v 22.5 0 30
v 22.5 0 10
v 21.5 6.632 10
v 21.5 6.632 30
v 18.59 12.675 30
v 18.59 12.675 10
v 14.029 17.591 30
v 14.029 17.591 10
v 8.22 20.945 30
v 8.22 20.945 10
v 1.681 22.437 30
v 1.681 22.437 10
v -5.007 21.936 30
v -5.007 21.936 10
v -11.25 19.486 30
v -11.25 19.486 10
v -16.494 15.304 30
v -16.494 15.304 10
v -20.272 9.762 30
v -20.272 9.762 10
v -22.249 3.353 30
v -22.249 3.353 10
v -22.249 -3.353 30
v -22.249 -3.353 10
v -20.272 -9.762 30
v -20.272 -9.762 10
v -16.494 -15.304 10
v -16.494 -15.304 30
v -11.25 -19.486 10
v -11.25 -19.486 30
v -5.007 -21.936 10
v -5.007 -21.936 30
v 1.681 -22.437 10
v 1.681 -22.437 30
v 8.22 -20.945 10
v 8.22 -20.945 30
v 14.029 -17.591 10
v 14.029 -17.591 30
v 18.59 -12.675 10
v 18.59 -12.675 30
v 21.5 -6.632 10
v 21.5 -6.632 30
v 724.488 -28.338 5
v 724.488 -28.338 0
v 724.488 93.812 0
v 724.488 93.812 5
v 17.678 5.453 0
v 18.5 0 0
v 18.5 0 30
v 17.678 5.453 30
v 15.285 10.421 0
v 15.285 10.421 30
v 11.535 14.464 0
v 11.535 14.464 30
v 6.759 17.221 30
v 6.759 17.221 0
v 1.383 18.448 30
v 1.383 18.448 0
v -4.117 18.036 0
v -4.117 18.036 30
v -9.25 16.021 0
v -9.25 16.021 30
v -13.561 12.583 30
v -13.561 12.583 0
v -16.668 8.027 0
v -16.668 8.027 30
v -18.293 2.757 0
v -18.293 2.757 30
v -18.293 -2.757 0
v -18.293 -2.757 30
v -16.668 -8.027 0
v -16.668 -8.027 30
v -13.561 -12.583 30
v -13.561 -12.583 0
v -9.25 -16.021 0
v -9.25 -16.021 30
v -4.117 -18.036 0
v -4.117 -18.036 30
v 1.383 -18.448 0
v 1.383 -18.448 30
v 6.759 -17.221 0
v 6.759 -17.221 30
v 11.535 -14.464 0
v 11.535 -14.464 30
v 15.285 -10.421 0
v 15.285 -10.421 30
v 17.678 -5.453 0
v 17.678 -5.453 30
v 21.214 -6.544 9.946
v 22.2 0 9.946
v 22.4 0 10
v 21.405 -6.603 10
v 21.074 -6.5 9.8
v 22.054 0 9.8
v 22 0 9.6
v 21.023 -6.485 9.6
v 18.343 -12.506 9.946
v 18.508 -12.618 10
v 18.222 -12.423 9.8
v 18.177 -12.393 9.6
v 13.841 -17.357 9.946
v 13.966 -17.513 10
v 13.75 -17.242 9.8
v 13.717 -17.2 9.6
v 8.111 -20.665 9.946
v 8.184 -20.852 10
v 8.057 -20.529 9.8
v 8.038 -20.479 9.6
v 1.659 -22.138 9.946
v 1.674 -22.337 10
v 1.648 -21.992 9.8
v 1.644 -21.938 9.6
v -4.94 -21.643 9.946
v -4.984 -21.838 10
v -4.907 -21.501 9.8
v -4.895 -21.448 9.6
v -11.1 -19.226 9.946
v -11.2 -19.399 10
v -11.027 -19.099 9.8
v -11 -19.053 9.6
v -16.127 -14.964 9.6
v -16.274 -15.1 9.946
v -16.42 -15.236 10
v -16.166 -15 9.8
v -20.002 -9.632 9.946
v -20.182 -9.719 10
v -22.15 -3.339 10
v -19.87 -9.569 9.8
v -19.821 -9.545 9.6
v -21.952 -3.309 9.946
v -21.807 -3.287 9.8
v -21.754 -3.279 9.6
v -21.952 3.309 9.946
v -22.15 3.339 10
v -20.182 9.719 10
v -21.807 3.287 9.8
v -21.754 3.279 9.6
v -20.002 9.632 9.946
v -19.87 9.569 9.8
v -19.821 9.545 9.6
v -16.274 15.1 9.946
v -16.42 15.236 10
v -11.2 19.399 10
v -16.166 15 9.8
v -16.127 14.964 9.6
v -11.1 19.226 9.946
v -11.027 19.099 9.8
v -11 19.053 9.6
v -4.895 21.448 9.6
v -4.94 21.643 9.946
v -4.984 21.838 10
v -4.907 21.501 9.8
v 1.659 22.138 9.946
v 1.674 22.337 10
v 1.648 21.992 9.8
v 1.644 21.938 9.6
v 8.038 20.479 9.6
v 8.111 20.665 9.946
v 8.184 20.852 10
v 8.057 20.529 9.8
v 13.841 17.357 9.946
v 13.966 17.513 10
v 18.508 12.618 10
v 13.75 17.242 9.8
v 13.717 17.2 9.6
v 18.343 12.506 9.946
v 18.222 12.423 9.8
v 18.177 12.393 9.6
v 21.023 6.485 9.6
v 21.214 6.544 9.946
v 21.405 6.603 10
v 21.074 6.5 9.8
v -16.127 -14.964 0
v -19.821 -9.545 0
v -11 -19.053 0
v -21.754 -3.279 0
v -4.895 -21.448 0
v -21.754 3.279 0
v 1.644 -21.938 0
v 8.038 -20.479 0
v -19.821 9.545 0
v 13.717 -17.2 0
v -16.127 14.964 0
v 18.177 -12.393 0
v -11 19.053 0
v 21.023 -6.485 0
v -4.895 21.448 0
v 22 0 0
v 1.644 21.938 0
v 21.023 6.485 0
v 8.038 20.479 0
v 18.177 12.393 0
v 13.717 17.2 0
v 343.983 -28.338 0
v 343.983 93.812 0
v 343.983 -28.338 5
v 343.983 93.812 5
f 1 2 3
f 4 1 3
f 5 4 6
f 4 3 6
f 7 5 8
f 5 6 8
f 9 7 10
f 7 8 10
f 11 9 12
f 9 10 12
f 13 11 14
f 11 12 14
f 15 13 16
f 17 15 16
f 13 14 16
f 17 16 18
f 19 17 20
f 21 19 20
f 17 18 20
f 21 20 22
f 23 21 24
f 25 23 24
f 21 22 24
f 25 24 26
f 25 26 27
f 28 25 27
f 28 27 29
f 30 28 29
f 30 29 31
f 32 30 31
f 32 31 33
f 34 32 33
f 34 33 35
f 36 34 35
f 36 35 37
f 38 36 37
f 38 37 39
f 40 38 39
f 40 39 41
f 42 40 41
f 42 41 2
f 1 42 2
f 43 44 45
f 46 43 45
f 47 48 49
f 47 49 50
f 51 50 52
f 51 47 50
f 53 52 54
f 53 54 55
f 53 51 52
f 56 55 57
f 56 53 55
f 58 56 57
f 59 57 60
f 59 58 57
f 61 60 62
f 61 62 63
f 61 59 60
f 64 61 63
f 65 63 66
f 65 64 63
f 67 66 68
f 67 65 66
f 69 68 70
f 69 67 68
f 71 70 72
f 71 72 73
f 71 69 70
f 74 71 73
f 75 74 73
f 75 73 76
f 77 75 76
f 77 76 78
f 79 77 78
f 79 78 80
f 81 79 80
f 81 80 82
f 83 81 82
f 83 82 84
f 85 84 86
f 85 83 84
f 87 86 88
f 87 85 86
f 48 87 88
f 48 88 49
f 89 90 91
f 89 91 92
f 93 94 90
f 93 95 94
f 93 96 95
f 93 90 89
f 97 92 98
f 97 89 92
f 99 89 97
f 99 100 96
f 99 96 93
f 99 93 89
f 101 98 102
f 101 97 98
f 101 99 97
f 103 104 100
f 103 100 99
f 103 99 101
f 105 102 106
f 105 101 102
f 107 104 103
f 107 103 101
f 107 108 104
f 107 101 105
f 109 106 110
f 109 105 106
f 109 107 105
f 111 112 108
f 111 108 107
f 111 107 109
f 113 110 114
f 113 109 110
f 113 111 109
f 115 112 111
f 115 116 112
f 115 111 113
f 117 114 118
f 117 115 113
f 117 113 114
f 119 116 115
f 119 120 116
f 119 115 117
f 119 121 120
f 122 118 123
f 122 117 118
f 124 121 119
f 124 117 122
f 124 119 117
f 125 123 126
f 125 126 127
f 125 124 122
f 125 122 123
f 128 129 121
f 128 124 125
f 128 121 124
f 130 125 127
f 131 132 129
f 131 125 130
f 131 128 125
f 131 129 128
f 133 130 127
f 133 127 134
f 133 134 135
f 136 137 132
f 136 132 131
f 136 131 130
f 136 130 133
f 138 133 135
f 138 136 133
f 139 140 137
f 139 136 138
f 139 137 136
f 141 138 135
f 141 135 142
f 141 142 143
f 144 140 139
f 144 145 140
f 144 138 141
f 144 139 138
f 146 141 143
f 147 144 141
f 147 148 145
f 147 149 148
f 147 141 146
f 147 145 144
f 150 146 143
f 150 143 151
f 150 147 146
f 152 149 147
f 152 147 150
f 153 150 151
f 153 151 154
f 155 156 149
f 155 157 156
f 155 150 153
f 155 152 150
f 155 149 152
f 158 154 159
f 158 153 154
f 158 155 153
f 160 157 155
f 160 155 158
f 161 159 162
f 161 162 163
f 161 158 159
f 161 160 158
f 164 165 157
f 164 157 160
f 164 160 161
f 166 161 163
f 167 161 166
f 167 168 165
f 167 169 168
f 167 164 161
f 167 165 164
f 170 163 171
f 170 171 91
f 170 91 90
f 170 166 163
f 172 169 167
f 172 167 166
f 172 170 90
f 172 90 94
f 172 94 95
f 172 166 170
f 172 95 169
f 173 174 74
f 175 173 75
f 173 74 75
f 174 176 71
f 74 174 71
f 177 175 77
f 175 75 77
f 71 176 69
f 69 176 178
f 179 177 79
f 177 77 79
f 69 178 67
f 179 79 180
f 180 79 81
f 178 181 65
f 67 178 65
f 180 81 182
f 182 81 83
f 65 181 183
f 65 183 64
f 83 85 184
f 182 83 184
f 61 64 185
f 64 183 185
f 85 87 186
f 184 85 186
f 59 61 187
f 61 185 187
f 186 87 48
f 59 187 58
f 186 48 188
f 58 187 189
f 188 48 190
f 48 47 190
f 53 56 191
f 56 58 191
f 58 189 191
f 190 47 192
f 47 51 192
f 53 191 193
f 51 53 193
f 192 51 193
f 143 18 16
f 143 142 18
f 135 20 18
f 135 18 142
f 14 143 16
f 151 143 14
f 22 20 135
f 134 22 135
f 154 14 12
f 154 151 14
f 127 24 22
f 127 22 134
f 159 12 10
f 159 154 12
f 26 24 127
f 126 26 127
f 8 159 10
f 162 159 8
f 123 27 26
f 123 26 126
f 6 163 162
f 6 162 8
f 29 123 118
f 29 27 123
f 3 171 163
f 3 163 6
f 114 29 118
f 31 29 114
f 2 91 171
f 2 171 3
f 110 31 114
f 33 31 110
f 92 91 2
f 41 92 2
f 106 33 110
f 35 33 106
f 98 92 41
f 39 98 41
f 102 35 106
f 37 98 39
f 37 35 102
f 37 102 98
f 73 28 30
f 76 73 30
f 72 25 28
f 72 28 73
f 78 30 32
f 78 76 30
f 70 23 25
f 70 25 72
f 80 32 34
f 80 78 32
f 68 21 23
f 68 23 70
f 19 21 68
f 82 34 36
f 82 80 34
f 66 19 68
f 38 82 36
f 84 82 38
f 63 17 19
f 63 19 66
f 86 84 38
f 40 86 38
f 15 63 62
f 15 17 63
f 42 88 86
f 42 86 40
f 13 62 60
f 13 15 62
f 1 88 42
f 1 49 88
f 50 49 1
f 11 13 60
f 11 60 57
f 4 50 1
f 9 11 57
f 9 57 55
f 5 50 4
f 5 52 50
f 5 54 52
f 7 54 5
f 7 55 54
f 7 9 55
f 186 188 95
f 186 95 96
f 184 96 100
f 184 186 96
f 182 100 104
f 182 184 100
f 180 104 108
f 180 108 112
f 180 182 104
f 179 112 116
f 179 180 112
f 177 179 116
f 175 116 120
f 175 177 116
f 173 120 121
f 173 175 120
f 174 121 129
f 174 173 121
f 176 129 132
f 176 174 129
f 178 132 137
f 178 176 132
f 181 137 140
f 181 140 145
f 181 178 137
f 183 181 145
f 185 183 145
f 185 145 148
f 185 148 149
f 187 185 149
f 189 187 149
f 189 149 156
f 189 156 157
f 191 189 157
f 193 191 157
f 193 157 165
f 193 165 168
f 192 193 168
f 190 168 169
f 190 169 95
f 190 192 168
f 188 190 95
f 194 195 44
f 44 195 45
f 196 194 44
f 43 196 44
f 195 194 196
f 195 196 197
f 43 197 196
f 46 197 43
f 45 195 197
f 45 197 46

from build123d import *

# Parameters (mm, degrees)
F0_R     = 22.5
F0_R_2   = 18.5
F1_DEPTH = 30
F2_R     = 22.5
F2_R_2   = 22
F3_DEPTH = 10
F4_W     = 380.505711
F4_H     = 122.149726
F5_DEPTH = 5
F6_R     = 0.4


with BuildPart() as f1:
    # F0 (on Top) → F1 (new body)
    with BuildSketch(Plane.XY):
        Circle(F0_R)
        Circle(F0_R_2, mode=Mode.SUBTRACT)
    extrude(amount=F1_DEPTH)

    # F2 (on face) → F3 (cut)
    with BuildSketch(Plane(origin=(0, 0, 0), x_dir=(1, 0, 0), z_dir=(0, 0, -1))):
        Circle(F2_R)
        Circle(F2_R_2, mode=Mode.SUBTRACT)
    extrude(amount=-F3_DEPTH, mode=Mode.SUBTRACT)

    # F6
    f6_edges = [f1.edges().sort_by_distance(p)[0] for p in [
        (-22, 0, 10),
    ]]
    fillet(f6_edges, radius=F6_R)


with BuildPart() as f5:
    # F4 (on Top) → F5 (new body)
    with BuildSketch(Plane.XY):
        with Locations((534.235581, 32.73688)):
            Rectangle(F4_W, F4_H)
    extrude(amount=F5_DEPTH)


solid = Compound([f1.part, f5.part])
